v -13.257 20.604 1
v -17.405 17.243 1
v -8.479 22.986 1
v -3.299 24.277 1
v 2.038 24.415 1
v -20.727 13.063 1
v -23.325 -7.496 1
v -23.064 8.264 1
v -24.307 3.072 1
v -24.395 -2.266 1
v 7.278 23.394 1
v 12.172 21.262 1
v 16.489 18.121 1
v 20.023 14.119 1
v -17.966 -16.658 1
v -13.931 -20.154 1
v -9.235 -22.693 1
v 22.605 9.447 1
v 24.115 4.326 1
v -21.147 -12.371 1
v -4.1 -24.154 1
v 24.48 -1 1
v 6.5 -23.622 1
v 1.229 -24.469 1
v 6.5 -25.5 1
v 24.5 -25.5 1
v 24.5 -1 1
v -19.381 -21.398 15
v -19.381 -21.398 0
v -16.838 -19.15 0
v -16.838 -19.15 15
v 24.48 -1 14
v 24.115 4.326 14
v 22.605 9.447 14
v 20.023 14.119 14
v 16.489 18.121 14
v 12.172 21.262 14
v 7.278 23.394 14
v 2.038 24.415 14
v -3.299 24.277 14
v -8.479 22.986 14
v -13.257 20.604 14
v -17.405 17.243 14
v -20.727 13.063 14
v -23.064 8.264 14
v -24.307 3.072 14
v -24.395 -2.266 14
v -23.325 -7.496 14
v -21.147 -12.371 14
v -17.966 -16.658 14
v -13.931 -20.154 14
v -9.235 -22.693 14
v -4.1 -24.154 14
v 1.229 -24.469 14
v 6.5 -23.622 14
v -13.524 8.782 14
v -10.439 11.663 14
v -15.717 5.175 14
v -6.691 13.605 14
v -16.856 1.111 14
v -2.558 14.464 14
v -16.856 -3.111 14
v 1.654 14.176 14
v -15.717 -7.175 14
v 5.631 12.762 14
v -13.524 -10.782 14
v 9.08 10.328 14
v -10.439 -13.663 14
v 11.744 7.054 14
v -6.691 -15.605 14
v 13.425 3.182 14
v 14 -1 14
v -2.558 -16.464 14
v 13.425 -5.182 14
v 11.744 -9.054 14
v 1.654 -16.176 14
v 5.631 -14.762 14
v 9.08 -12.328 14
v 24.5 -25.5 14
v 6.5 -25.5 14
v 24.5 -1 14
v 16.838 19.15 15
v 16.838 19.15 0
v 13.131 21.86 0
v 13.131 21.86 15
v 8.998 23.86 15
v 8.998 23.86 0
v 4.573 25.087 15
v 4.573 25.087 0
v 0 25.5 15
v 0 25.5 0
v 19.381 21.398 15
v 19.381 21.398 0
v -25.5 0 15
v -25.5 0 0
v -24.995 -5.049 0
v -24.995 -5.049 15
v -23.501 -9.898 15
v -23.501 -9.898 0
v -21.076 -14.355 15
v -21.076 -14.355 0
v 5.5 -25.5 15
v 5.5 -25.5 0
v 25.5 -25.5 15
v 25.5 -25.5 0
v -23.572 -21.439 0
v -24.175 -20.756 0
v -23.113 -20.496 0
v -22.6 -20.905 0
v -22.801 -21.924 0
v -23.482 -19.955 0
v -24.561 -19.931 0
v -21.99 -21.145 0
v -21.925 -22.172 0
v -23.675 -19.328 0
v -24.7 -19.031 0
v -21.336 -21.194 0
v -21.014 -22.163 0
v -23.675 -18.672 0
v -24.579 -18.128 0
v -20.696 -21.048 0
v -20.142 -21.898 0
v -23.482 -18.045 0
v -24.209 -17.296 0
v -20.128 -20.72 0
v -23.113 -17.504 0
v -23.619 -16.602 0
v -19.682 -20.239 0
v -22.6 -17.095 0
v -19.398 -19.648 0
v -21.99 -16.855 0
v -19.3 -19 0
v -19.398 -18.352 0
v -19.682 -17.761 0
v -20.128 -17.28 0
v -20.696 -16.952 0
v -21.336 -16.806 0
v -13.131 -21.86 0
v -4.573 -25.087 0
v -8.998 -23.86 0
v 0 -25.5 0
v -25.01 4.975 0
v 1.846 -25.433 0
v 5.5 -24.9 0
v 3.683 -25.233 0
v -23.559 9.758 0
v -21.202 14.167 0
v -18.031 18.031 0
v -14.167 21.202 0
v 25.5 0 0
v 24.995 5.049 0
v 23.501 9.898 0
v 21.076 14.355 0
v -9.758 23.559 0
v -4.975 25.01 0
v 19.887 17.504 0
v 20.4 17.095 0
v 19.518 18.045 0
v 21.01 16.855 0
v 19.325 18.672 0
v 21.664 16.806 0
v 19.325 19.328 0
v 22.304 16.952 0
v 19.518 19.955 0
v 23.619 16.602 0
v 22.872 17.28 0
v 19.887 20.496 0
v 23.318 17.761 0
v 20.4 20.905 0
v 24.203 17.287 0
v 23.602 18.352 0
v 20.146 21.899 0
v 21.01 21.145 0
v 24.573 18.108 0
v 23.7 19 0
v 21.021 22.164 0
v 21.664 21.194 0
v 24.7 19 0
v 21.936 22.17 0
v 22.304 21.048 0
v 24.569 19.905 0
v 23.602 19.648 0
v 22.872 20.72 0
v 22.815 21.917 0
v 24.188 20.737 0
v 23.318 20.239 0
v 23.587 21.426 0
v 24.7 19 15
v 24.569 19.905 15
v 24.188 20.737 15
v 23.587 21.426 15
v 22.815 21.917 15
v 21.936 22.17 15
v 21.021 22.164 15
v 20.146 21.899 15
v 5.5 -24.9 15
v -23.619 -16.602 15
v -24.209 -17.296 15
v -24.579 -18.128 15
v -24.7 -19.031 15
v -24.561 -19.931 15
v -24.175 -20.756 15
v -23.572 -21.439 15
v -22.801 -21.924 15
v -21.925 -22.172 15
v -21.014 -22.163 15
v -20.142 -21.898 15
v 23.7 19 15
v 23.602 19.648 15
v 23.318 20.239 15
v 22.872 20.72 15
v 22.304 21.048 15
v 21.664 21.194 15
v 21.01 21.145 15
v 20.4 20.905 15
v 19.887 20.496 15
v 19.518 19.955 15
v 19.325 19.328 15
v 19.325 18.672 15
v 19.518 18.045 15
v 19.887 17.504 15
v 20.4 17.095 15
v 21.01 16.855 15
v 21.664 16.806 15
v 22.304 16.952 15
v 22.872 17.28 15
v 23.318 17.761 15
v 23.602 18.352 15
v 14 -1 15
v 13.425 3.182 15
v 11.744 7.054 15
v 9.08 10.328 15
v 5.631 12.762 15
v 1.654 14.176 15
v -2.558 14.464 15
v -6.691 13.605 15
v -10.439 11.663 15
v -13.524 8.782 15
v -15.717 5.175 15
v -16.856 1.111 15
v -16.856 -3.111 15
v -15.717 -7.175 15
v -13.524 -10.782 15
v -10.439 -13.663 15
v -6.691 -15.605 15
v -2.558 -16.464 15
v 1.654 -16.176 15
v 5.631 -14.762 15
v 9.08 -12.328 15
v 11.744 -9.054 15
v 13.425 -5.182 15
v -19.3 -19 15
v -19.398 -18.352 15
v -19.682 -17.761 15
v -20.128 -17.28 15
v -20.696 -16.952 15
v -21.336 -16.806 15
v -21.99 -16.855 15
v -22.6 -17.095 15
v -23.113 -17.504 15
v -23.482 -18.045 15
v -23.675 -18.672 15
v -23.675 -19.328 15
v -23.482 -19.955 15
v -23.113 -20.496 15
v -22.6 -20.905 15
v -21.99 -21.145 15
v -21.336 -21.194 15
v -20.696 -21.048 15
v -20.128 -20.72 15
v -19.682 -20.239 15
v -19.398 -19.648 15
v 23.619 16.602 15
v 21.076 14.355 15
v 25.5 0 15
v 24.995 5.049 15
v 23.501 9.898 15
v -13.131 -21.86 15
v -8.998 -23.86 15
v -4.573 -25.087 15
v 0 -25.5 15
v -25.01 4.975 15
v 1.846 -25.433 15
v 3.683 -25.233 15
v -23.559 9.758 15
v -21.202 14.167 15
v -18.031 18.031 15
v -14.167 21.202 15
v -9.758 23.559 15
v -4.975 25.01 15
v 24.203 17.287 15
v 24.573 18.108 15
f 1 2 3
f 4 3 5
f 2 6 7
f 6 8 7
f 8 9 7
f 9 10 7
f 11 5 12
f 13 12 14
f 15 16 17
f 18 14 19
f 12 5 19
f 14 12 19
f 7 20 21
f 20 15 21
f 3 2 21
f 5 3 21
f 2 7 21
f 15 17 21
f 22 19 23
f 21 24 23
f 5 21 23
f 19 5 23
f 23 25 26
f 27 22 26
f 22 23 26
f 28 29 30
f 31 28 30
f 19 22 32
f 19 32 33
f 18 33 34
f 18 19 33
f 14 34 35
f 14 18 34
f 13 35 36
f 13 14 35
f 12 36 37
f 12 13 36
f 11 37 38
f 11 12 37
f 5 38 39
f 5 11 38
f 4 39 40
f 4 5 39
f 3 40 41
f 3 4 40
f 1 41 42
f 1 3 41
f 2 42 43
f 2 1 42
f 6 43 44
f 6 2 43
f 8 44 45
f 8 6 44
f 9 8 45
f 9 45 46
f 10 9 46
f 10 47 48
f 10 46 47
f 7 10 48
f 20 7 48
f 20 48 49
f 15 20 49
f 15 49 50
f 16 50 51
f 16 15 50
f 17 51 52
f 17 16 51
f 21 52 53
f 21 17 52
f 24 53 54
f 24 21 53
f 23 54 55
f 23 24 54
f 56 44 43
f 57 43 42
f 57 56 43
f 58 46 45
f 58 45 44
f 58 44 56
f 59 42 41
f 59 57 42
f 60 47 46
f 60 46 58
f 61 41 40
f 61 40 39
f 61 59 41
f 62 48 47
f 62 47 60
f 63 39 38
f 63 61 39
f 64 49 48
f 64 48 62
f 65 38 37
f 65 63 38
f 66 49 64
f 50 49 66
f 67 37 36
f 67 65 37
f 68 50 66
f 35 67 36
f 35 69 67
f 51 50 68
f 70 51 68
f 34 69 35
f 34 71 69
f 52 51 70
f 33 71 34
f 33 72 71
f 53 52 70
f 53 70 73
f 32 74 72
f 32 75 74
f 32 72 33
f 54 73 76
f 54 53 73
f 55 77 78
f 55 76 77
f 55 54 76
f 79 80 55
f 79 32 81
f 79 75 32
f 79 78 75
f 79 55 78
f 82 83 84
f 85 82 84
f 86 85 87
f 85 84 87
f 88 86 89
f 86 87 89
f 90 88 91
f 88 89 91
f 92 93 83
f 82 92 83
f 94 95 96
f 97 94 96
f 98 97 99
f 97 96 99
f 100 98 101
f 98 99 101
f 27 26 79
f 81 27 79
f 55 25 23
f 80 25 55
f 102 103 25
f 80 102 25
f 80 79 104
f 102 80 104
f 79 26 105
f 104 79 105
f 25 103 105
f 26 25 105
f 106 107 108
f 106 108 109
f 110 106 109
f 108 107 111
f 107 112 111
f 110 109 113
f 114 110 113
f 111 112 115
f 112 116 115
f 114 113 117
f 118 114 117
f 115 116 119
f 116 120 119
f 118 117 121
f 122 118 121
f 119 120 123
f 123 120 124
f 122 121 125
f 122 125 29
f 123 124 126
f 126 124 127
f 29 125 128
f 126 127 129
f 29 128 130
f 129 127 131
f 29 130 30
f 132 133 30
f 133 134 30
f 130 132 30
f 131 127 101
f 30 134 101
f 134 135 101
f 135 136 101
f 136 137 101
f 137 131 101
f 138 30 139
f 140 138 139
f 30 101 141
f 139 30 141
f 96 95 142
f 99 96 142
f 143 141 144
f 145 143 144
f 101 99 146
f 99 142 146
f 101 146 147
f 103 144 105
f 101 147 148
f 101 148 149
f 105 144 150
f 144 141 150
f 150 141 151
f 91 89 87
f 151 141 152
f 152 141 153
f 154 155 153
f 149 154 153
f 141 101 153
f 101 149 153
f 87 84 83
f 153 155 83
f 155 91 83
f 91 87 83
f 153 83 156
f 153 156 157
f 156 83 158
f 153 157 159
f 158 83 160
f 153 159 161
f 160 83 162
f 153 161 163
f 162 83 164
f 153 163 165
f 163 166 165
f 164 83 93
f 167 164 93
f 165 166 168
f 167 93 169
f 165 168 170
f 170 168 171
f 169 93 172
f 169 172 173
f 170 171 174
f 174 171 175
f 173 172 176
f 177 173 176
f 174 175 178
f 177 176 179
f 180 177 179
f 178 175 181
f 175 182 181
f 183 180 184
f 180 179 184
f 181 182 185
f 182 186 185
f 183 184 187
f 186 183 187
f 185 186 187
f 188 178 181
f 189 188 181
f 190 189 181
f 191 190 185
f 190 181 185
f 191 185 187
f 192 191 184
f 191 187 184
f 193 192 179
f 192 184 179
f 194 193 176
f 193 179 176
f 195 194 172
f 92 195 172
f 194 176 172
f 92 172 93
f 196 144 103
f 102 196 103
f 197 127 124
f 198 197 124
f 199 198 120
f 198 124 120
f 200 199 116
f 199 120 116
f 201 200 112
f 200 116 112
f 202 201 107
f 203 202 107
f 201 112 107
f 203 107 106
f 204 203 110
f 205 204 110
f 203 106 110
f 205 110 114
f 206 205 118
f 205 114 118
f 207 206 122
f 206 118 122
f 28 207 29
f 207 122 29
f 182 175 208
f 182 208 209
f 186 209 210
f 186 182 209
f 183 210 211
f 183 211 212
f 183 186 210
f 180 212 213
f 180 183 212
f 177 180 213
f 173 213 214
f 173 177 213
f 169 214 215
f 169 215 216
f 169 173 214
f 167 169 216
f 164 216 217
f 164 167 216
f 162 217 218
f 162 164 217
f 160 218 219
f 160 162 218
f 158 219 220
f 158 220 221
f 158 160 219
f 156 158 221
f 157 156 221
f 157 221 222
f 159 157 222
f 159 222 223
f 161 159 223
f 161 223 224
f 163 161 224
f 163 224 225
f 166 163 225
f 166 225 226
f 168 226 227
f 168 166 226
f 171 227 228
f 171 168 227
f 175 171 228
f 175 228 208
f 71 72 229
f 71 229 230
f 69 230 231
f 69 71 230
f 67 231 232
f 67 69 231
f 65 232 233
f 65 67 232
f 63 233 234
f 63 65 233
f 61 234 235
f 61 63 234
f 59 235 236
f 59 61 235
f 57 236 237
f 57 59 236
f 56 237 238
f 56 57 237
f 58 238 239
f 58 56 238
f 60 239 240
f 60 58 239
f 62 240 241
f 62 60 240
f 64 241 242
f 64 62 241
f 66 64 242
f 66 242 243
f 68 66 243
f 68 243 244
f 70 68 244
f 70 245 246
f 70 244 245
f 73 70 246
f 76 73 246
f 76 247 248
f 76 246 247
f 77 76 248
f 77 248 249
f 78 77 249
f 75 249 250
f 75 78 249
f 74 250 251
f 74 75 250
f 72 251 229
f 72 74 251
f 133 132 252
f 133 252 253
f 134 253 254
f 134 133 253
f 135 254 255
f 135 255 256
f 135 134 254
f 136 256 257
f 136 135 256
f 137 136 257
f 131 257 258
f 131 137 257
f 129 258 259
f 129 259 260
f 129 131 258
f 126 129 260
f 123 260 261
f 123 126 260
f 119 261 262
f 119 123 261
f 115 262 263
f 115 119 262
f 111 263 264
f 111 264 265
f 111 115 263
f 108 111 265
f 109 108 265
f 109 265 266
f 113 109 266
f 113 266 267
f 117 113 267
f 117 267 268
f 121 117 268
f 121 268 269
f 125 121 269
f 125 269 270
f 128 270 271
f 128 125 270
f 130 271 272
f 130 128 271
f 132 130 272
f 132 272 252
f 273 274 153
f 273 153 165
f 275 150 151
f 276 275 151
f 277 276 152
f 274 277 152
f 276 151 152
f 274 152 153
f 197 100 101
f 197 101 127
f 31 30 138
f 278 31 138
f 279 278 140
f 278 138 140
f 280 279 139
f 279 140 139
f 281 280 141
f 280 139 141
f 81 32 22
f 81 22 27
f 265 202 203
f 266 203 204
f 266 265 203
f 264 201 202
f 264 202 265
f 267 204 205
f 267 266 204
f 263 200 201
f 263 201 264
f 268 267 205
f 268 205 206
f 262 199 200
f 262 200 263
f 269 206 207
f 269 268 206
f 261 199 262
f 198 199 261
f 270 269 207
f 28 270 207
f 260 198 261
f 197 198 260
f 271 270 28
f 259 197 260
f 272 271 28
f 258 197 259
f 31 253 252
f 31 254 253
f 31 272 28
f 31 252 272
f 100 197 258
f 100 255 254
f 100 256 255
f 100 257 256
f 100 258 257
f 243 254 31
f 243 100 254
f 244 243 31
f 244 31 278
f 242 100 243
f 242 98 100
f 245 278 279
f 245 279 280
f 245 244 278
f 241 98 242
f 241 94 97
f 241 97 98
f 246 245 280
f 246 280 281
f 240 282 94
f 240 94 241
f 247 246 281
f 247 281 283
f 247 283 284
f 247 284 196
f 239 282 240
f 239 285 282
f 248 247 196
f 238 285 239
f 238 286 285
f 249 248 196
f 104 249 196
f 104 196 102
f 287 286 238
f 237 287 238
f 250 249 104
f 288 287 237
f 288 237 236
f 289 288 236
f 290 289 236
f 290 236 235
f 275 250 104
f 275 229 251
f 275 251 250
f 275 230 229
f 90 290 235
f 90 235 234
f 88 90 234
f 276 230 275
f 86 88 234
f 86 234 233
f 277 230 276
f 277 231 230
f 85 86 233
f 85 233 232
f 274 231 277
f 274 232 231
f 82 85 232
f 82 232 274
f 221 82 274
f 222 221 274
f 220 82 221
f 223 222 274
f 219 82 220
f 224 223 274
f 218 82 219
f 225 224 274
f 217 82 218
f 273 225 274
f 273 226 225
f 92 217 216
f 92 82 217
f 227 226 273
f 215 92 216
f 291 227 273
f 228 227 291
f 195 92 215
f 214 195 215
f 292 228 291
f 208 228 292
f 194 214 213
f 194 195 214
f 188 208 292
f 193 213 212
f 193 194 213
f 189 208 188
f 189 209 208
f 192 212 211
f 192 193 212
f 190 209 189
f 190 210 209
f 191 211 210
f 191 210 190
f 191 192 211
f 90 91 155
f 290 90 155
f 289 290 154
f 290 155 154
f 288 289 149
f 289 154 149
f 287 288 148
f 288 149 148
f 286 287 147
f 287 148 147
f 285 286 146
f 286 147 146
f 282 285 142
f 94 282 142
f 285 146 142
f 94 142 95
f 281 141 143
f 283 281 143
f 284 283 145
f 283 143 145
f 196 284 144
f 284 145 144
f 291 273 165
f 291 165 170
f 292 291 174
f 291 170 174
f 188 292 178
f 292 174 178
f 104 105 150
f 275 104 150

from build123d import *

# Parameters (mm, degrees)
F1_R     = 24.5
F1_R_2   = 15.5
F1_R_3   = 2.2
F2_DEPTH = 15
F3_START = 1
F3_DEPTH = 24
F4_START = 1
F4_DEPTH = 13
F5_W     = 18
F5_H     = 13
F6_DEPTH = 24.5


with BuildPart() as f2:
    # F1 (on Top) → F2 (new body)
    with BuildSketch(Plane.XY):
        with BuildLine():
            ThreePointArc((5.5, -24.899799196), (19.8808953521, -15.9687194227), (25.5, 0))
            ThreePointArc((25.5, 0), (24.3688816797, 7.5104996957), (21.0758740643, 14.3547041914))
            ThreePointArc((21.0758740643, 14.3547041914), (20.1955865128, 15.5688241496), (19.2454493009, 16.7290968438))
            ThreePointArc((19.2454493009, 16.7290968438), (19.1021469265, 16.8809670513), (18.9690541914, 17.0418597308))
            ThreePointArc((18.9690541914, 17.0418597308), (17.9344457512, 18.1274834325), (16.8378081669, 19.1504103385))
            ThreePointArc((16.8378081669, 19.1504103385), (8.9976257046, 23.85985607), (1.63e-08, 25.5))
            ThreePointArc((1.63e-08, 25.5), (-18.0312229145, 18.031222926), (-25.5, 0))
            ThreePointArc((-25.5, 0), (-24.3688816797, -7.5104996957), (-21.0758740643, -14.3547041914))
            ThreePointArc((-21.0758740643, -14.3547041914), (-20.1955865128, -15.5688241496), (-19.2454493009, -16.7290968438))
            ThreePointArc((-19.2454493009, -16.7290968438), (-19.1021469265, -16.8809670513), (-18.9690541914, -17.0418597308))
            ThreePointArc((-18.9690541914, -17.0418597308), (-17.9344457512, -18.1274834325), (-16.8378081669, -19.1504103385))
            ThreePointArc((-16.8378081669, -19.1504103385), (-8.99762568, -23.8598560793), (3.64e-08, -25.5))
            ThreePointArc((3.64e-08, -25.5), (2.766326147, -25.3495057082), (5.5, -24.899799196))
        make_face()
        Circle(F1_R, mode=Mode.SUBTRACT)
        Circle(F1_R)
        with Locations((-1.5, -1)):
            Circle(F1_R_2, mode=Mode.SUBTRACT)
        with Locations((-1.5, -1)):
            Circle(F1_R_2)
        with BuildLine():
            Line((5.5, -25.5), (25.5, -25.5))
            Line((25.5, -25.5), (25.5, 0))
            ThreePointArc((25.5, 0), (19.8808953521, -15.9687194227), (5.5, -24.899799196))
            Line((5.5, -24.899799196), (5.5, -25.5))
        make_face()
        with BuildLine():
            ThreePointArc((-18.3, -19), (-18.4718795774, -17.9653567251), (-18.9690541914, -17.0418597308))
            ThreePointArc((-18.9690541914, -17.0418597308), (-19.1078916798, -16.88604381), (-19.2454493009, -16.7290968438))
            ThreePointArc((-19.2454493009, -16.7290968438), (-21.4071542379, -15.801347211), (-23.6190329487, -16.6021469265))
            ThreePointArc((-23.6190329487, -16.6021469265), (-23.8978530735, -21.1190329487), (-19.3809670513, -21.3978530735))
            ThreePointArc((-19.3809670513, -21.3978530735), (-18.582731977, -20.315122535), (-18.3, -19))
        make_face()
        with Locations((-21.5, -19)):
            Circle(F1_R_3, mode=Mode.SUBTRACT)
        with BuildLine():
            ThreePointArc((18.9690541914, 17.0418597308), (19.1078916798, 16.88604381), (19.2454493009, 16.7290968438))
            ThreePointArc((19.2454493009, 16.7290968438), (21.4071542379, 15.801347211), (23.6190329487, 16.6021469265))
            ThreePointArc((23.6190329487, 16.6021469265), (24.417268023, 17.684877465), (24.7, 19))
            ThreePointArc((24.7, 19), (22.815122535, 21.917268023), (19.3809670513, 21.3978530735))
            ThreePointArc((19.3809670513, 21.3978530735), (18.3142120109, 19.3012555205), (18.9690541914, 17.0418597308))
        make_face()
        with Locations((21.5, 19)):
            Circle(F1_R_3, mode=Mode.SUBTRACT)
        with BuildLine():
            Line((-19.3809670513, -21.3978530735), (-16.8378081669, -19.1504103385))
            ThreePointArc((-16.8378081669, -19.1504103385), (-17.9344457512, -18.1274834325), (-18.9690541914, -17.0418597308))
            ThreePointArc((-18.9690541914, -17.0418597308), (-18.4718795774, -17.9653567251), (-18.3, -19))
            ThreePointArc((-18.3, -19), (-18.582731977, -20.315122535), (-19.3809670513, -21.3978530735))
        make_face()
        with BuildLine():
            ThreePointArc((-19.2454493009, -16.7290968438), (-20.1955865128, -15.5688241496), (-21.0758740643, -14.3547041914))
            Line((-21.0758740643, -14.3547041914), (-23.6190329487, -16.6021469265))
            ThreePointArc((-23.6190329487, -16.6021469265), (-21.4071542379, -15.801347211), (-19.2454493009, -16.7290968438))
        make_face()
        with BuildLine():
            ThreePointArc((19.2454493009, 16.7290968438), (20.1955865128, 15.5688241496), (21.0758740643, 14.3547041914))
            Line((21.0758740643, 14.3547041914), (23.6190329487, 16.6021469265))
            ThreePointArc((23.6190329487, 16.6021469265), (21.4071542379, 15.801347211), (19.2454493009, 16.7290968438))
        make_face()
        with BuildLine():
            Line((19.3809670513, 21.3978530735), (16.8378081669, 19.1504103385))
            ThreePointArc((16.8378081669, 19.1504103385), (17.9344457512, 18.1274834325), (18.9690541914, 17.0418597308))
            ThreePointArc((18.9690541914, 17.0418597308), (18.3142120109, 19.3012555205), (19.3809670513, 21.3978530735))
        make_face()
        with BuildLine():
            ThreePointArc((-19.2454493009, -16.7290968438), (-19.1078916798, -16.88604381), (-18.9690541914, -17.0418597308))
            ThreePointArc((-18.9690541914, -17.0418597308), (-19.1021469265, -16.8809670513), (-19.2454493009, -16.7290968438))
        make_face()
        with BuildLine():
            ThreePointArc((18.9690541914, 17.0418597308), (19.1021469265, 16.8809670513), (19.2454493009, 16.7290968438))
            ThreePointArc((19.2454493009, 16.7290968438), (19.1078916798, 16.88604381), (18.9690541914, 17.0418597308))
        make_face()
    extrude(amount=F2_DEPTH)

    # F1 (on Top) → F3 (cut)
    with BuildSketch(Plane.XY.offset(F3_START)):
        with Locations((-1.5, -1)):
            Circle(F1_R_2)
    extrude(amount=F3_DEPTH, mode=Mode.SUBTRACT)

    # F1 (on Top) → F4 (cut)
    with BuildSketch(Plane.XY.offset(F4_START)):
        Circle(F1_R)
        with Locations((-1.5, -1)):
            Circle(F1_R_2, mode=Mode.SUBTRACT)
        with Locations((-1.5, -1)):
            Circle(F1_R_2)
    extrude(amount=F4_DEPTH, mode=Mode.SUBTRACT)

    # F5 (on face) → F6 (cut, through all)
    with BuildSketch(Plane.XZ.offset(25.5)):
        with Locations((15.5, 7.5)):
            Rectangle(F5_W, F5_H)
    extrude(amount=-F6_DEPTH, mode=Mode.SUBTRACT)


solid = f2.part
